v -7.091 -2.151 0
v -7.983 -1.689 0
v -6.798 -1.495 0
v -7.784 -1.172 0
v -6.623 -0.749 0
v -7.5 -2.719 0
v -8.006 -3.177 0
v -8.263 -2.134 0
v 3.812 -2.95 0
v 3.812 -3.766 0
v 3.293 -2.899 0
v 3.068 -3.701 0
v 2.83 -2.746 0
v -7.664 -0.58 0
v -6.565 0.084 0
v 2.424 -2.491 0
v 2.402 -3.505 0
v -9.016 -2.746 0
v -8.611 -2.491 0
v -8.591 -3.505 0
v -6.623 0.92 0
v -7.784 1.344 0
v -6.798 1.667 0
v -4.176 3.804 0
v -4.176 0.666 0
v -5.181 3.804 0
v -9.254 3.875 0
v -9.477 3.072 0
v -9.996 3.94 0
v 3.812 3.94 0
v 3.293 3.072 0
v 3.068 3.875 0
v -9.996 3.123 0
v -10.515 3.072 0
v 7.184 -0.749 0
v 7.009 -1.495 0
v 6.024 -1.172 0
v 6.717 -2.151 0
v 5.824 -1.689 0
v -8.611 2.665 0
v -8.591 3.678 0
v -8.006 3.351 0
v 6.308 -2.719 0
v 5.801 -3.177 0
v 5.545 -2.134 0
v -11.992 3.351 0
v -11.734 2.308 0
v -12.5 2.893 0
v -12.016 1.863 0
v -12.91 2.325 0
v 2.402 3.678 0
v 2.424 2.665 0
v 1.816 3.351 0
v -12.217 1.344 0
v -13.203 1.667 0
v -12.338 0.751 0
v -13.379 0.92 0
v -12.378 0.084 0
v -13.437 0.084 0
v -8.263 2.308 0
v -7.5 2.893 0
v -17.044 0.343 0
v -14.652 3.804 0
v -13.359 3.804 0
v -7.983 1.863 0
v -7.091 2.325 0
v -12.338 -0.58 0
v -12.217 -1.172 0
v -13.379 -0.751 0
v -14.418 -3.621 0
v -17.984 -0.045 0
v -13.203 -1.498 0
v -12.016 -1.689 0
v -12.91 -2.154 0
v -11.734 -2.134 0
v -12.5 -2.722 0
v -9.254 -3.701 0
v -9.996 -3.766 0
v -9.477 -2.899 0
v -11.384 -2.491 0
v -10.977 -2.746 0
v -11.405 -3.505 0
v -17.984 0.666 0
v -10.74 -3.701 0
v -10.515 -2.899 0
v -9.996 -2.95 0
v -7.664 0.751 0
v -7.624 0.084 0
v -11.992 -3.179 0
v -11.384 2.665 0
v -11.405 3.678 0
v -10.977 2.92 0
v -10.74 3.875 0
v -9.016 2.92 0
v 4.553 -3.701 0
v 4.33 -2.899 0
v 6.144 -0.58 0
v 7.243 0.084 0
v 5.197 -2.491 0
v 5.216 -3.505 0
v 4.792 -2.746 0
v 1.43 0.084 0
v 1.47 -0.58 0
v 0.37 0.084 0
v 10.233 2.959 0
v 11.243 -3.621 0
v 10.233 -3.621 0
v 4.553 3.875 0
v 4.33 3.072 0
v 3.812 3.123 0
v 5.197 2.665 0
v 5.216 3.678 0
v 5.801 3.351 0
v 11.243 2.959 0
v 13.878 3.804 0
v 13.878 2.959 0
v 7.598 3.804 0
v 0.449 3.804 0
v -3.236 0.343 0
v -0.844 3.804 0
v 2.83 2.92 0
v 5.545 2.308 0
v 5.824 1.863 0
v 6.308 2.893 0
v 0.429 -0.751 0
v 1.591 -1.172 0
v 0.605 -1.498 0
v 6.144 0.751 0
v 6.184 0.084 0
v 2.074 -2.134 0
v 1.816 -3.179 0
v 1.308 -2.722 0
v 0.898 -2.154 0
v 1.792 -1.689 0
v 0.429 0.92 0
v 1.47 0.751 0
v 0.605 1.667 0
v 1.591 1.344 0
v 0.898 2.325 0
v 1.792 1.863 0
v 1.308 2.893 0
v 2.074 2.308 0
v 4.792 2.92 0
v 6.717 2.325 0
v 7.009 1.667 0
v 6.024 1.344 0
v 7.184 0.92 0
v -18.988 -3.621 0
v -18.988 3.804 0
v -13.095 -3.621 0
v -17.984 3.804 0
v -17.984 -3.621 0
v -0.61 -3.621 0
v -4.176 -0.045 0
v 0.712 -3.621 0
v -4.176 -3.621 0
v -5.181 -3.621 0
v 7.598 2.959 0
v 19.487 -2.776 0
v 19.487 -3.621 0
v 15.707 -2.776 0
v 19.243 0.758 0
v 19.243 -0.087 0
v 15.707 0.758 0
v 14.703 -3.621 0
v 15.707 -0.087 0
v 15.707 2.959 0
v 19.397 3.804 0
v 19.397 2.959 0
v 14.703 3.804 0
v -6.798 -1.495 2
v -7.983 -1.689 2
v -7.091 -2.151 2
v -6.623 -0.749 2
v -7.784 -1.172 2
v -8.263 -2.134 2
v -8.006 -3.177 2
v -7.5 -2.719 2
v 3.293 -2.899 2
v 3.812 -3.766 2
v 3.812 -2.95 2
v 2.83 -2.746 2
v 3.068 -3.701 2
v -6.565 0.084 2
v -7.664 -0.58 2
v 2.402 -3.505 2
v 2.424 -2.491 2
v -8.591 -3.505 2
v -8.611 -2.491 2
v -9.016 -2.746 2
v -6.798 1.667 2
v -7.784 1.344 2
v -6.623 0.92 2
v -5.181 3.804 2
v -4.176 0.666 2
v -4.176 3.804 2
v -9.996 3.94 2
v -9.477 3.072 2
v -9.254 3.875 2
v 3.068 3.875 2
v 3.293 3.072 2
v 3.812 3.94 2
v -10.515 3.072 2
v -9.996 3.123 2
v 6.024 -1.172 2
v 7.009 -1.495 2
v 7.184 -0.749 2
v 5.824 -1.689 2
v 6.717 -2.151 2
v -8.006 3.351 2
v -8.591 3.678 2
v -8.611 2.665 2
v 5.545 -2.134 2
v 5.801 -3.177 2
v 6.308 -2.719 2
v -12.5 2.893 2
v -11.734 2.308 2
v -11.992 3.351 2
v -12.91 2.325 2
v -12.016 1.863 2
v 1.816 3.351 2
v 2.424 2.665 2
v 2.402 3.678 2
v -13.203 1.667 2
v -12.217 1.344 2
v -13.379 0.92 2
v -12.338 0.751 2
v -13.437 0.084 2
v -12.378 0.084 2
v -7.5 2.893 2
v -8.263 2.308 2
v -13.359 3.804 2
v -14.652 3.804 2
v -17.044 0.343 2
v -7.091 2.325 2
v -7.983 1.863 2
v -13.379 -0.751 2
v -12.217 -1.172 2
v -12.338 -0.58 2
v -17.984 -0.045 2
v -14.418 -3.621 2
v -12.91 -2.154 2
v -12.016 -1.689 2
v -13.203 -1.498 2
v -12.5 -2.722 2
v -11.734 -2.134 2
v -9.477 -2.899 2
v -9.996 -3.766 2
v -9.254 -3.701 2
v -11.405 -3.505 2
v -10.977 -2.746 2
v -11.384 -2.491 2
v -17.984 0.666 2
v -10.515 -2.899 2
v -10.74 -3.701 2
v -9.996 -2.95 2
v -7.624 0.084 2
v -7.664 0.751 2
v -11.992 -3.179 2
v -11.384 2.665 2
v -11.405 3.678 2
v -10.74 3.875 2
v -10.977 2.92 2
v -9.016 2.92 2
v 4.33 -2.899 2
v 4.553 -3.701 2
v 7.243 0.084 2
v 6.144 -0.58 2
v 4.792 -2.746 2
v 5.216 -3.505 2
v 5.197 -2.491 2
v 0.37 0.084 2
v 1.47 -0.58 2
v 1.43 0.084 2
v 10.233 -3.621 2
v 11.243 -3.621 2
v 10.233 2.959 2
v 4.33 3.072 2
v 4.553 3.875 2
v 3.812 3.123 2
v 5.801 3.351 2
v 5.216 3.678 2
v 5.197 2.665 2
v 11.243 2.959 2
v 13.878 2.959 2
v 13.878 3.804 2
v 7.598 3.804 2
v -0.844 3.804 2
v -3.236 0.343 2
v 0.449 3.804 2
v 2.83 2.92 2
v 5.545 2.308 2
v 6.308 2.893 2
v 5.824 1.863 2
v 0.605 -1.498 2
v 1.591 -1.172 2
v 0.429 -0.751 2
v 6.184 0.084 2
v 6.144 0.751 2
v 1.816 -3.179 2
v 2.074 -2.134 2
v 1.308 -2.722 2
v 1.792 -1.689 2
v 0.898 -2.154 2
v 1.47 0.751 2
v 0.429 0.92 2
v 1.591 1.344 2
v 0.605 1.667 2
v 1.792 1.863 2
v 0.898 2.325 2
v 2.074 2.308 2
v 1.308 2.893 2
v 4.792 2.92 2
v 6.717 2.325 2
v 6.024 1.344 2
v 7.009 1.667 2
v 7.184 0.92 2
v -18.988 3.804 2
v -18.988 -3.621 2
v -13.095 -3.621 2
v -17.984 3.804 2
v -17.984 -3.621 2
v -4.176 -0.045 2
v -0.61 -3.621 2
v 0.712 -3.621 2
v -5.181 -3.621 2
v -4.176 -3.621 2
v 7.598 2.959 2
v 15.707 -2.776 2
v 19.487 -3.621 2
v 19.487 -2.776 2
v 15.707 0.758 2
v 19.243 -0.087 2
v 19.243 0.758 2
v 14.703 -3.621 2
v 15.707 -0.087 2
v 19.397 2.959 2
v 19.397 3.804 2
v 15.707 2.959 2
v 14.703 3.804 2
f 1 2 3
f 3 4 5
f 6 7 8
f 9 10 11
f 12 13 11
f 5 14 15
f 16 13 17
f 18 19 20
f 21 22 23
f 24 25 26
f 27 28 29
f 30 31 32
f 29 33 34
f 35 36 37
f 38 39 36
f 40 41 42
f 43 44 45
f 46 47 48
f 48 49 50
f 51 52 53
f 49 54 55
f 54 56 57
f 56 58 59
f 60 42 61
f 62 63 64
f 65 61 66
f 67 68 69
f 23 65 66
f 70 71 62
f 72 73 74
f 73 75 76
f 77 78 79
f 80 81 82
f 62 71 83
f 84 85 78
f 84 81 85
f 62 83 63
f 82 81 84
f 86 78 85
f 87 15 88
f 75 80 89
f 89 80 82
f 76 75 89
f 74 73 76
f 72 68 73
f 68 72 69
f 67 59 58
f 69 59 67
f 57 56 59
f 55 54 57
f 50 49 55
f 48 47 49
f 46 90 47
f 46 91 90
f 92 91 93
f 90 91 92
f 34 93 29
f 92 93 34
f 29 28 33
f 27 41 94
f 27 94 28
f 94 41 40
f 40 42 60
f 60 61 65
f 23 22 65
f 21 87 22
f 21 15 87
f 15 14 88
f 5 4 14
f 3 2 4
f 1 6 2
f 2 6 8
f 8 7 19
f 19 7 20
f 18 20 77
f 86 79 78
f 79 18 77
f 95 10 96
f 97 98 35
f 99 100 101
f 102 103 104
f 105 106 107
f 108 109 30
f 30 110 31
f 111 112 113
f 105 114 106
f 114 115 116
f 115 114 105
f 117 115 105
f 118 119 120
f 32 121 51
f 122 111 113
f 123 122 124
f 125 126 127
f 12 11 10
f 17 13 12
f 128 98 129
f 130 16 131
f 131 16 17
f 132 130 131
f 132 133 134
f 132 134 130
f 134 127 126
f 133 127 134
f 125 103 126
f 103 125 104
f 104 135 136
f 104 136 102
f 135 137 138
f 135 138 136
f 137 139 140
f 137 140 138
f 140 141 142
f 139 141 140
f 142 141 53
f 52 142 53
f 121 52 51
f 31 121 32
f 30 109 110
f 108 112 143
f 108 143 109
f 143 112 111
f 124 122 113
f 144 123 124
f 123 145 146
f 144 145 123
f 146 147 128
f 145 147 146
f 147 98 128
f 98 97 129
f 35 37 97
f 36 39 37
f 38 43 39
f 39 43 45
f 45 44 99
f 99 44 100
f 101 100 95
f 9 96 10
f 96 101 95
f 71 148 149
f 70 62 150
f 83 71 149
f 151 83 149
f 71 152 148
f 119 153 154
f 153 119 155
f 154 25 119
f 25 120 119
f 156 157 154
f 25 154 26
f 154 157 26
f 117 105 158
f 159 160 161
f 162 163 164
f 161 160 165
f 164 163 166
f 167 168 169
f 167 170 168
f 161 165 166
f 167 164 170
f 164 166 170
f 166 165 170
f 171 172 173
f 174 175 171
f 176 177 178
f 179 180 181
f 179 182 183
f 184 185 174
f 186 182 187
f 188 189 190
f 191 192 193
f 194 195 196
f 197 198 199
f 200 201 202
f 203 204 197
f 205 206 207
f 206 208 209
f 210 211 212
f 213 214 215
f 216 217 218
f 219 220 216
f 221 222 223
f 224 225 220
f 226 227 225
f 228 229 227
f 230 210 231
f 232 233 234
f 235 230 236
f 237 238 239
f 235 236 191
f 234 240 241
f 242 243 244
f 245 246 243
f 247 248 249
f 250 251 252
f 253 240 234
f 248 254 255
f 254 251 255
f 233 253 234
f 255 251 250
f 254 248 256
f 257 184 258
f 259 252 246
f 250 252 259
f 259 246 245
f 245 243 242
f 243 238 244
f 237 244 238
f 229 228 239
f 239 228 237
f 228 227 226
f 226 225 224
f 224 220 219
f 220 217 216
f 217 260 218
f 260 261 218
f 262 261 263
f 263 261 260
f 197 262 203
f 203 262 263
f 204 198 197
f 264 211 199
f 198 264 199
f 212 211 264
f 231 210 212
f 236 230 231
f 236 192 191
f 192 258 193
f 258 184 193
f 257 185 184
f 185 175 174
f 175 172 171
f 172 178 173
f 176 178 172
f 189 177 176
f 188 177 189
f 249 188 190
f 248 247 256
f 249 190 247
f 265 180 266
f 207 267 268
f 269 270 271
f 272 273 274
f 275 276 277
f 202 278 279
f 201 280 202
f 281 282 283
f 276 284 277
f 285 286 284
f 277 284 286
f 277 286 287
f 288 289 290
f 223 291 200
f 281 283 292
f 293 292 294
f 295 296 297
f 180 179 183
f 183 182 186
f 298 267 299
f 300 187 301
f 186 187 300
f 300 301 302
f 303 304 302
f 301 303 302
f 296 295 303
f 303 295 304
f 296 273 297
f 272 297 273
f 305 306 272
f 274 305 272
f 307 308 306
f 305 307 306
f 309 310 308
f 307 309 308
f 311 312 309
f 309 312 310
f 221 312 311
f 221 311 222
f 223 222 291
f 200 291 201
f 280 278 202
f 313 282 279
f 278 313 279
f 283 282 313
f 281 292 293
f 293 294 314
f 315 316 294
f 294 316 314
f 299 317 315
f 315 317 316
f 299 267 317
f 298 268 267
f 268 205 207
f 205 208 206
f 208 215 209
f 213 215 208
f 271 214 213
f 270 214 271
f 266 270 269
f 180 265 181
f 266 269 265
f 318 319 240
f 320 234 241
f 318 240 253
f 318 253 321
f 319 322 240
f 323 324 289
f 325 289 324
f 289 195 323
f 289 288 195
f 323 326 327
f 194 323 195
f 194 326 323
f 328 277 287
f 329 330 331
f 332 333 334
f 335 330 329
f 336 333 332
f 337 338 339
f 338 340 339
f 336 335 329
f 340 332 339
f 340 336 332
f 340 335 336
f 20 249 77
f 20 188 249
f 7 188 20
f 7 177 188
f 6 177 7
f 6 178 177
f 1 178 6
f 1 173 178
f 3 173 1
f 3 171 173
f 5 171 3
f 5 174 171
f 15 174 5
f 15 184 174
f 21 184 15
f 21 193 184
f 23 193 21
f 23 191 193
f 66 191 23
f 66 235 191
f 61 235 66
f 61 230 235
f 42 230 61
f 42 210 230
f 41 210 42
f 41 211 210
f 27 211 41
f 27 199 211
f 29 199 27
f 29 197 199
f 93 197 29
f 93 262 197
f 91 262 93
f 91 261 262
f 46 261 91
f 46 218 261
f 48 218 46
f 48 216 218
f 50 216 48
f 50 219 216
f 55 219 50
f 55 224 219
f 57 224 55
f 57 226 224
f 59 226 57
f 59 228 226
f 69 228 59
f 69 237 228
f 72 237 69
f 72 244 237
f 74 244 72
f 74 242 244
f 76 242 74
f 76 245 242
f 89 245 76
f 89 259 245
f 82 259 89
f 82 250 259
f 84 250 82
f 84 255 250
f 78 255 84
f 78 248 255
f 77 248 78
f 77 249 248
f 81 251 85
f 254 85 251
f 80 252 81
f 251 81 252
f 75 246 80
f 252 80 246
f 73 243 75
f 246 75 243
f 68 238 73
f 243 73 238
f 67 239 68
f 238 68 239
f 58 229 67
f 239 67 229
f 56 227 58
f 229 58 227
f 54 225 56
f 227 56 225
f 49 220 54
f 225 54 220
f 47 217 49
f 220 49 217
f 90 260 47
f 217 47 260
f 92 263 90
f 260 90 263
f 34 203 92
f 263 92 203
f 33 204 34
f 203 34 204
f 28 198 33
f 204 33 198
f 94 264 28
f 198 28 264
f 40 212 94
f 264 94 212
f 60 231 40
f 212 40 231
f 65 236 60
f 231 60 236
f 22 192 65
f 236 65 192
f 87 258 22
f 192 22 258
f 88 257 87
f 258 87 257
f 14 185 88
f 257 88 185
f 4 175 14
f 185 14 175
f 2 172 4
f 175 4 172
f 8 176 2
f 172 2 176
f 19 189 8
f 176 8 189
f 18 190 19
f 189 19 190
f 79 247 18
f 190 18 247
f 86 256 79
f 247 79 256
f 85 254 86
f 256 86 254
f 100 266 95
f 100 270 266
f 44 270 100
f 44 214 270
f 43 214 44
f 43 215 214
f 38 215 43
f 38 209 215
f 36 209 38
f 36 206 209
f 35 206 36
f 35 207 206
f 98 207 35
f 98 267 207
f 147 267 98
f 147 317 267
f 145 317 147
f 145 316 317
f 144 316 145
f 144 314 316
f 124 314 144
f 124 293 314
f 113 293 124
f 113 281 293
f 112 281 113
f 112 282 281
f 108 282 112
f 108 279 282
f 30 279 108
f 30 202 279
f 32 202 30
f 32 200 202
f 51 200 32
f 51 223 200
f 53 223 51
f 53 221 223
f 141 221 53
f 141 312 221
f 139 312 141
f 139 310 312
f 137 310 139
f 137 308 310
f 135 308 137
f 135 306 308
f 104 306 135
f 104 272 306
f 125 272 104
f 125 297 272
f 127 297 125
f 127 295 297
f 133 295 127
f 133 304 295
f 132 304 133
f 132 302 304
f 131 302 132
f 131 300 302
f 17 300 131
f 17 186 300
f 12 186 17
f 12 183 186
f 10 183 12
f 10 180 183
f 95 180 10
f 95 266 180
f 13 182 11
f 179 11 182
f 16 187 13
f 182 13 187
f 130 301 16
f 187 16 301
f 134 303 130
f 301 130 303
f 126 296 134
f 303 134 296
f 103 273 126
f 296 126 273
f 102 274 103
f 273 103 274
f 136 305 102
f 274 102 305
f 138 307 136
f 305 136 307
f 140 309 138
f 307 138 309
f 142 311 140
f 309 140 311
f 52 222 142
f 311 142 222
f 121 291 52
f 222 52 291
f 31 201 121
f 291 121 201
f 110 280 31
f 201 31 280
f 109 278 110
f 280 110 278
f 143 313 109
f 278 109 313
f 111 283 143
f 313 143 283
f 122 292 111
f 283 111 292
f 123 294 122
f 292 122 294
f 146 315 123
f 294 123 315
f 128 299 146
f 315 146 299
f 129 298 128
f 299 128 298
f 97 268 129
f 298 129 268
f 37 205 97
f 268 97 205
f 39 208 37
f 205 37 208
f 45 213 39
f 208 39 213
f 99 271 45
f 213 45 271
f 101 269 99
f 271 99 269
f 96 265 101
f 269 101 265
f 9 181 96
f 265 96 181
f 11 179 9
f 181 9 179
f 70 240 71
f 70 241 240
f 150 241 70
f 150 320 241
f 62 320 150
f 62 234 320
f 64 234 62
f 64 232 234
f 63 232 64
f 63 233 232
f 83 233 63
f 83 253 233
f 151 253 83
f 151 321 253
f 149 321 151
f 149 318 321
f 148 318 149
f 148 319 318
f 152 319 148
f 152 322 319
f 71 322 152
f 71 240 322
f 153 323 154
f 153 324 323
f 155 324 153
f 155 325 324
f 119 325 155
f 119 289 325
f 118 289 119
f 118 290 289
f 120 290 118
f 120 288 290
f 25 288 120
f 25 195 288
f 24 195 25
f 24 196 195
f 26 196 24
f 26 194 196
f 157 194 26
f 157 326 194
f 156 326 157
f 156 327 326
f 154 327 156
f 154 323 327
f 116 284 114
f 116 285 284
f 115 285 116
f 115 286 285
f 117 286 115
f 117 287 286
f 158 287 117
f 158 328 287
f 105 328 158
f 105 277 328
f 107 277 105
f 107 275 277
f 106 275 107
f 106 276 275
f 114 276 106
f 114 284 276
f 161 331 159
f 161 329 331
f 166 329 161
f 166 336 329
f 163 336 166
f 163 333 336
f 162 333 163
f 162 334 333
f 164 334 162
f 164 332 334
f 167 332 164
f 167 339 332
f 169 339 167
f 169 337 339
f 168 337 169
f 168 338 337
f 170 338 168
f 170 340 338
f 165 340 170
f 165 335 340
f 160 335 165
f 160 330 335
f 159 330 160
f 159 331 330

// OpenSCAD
// LetterBlock.scad - Basic usage of text() and linear_extrude()

// Module instantiation
SimpleLetterBlock("KOKOTE");

// Module definition.
// size=30 defines an optional parameter with a default value.
module LetterBlock(letter, size=20) {
    difference() {
        translate([0,0,size/4]) cube([size,size,size/2], center=true);
        translate([0,0,size/6]) {
            // convexity is needed for correct preview
            // since characters can be highly concave
            linear_extrude(height=size, convexity=4)
                text(letter, 
                     size=size*22/30,
                     font="Bitstream Vera Sans",
                     halign="center",
                     valign="center");
        }
    }
}

module SimpleLetterBlock(letter, size=10) {
    difference() {
        
            // convexity is needed for correct preview
            // since characters can be highly concave
            linear_extrude(height=0.2*size, convexity=4)
                text(letter, 
                     size=size*22/30,
                     font="Bitstream Vera Sans",
                     halign="center",
                     valign="center");
        
    }
}

echo(version=version());
// Written by Marius Kintel <marius@kintel.net>
//
// To the extent possible under law, the author(s) have dedicated all
// copyright and related and neighboring rights to this software to the
// public domain worldwide. This software is distributed without any
// warranty.
//
// You should have received a copy of the CC0 Public Domain
// Dedication along with this software.
// If not, see <http://creativecommons.org/publicdomain/zero/1.0/>.
